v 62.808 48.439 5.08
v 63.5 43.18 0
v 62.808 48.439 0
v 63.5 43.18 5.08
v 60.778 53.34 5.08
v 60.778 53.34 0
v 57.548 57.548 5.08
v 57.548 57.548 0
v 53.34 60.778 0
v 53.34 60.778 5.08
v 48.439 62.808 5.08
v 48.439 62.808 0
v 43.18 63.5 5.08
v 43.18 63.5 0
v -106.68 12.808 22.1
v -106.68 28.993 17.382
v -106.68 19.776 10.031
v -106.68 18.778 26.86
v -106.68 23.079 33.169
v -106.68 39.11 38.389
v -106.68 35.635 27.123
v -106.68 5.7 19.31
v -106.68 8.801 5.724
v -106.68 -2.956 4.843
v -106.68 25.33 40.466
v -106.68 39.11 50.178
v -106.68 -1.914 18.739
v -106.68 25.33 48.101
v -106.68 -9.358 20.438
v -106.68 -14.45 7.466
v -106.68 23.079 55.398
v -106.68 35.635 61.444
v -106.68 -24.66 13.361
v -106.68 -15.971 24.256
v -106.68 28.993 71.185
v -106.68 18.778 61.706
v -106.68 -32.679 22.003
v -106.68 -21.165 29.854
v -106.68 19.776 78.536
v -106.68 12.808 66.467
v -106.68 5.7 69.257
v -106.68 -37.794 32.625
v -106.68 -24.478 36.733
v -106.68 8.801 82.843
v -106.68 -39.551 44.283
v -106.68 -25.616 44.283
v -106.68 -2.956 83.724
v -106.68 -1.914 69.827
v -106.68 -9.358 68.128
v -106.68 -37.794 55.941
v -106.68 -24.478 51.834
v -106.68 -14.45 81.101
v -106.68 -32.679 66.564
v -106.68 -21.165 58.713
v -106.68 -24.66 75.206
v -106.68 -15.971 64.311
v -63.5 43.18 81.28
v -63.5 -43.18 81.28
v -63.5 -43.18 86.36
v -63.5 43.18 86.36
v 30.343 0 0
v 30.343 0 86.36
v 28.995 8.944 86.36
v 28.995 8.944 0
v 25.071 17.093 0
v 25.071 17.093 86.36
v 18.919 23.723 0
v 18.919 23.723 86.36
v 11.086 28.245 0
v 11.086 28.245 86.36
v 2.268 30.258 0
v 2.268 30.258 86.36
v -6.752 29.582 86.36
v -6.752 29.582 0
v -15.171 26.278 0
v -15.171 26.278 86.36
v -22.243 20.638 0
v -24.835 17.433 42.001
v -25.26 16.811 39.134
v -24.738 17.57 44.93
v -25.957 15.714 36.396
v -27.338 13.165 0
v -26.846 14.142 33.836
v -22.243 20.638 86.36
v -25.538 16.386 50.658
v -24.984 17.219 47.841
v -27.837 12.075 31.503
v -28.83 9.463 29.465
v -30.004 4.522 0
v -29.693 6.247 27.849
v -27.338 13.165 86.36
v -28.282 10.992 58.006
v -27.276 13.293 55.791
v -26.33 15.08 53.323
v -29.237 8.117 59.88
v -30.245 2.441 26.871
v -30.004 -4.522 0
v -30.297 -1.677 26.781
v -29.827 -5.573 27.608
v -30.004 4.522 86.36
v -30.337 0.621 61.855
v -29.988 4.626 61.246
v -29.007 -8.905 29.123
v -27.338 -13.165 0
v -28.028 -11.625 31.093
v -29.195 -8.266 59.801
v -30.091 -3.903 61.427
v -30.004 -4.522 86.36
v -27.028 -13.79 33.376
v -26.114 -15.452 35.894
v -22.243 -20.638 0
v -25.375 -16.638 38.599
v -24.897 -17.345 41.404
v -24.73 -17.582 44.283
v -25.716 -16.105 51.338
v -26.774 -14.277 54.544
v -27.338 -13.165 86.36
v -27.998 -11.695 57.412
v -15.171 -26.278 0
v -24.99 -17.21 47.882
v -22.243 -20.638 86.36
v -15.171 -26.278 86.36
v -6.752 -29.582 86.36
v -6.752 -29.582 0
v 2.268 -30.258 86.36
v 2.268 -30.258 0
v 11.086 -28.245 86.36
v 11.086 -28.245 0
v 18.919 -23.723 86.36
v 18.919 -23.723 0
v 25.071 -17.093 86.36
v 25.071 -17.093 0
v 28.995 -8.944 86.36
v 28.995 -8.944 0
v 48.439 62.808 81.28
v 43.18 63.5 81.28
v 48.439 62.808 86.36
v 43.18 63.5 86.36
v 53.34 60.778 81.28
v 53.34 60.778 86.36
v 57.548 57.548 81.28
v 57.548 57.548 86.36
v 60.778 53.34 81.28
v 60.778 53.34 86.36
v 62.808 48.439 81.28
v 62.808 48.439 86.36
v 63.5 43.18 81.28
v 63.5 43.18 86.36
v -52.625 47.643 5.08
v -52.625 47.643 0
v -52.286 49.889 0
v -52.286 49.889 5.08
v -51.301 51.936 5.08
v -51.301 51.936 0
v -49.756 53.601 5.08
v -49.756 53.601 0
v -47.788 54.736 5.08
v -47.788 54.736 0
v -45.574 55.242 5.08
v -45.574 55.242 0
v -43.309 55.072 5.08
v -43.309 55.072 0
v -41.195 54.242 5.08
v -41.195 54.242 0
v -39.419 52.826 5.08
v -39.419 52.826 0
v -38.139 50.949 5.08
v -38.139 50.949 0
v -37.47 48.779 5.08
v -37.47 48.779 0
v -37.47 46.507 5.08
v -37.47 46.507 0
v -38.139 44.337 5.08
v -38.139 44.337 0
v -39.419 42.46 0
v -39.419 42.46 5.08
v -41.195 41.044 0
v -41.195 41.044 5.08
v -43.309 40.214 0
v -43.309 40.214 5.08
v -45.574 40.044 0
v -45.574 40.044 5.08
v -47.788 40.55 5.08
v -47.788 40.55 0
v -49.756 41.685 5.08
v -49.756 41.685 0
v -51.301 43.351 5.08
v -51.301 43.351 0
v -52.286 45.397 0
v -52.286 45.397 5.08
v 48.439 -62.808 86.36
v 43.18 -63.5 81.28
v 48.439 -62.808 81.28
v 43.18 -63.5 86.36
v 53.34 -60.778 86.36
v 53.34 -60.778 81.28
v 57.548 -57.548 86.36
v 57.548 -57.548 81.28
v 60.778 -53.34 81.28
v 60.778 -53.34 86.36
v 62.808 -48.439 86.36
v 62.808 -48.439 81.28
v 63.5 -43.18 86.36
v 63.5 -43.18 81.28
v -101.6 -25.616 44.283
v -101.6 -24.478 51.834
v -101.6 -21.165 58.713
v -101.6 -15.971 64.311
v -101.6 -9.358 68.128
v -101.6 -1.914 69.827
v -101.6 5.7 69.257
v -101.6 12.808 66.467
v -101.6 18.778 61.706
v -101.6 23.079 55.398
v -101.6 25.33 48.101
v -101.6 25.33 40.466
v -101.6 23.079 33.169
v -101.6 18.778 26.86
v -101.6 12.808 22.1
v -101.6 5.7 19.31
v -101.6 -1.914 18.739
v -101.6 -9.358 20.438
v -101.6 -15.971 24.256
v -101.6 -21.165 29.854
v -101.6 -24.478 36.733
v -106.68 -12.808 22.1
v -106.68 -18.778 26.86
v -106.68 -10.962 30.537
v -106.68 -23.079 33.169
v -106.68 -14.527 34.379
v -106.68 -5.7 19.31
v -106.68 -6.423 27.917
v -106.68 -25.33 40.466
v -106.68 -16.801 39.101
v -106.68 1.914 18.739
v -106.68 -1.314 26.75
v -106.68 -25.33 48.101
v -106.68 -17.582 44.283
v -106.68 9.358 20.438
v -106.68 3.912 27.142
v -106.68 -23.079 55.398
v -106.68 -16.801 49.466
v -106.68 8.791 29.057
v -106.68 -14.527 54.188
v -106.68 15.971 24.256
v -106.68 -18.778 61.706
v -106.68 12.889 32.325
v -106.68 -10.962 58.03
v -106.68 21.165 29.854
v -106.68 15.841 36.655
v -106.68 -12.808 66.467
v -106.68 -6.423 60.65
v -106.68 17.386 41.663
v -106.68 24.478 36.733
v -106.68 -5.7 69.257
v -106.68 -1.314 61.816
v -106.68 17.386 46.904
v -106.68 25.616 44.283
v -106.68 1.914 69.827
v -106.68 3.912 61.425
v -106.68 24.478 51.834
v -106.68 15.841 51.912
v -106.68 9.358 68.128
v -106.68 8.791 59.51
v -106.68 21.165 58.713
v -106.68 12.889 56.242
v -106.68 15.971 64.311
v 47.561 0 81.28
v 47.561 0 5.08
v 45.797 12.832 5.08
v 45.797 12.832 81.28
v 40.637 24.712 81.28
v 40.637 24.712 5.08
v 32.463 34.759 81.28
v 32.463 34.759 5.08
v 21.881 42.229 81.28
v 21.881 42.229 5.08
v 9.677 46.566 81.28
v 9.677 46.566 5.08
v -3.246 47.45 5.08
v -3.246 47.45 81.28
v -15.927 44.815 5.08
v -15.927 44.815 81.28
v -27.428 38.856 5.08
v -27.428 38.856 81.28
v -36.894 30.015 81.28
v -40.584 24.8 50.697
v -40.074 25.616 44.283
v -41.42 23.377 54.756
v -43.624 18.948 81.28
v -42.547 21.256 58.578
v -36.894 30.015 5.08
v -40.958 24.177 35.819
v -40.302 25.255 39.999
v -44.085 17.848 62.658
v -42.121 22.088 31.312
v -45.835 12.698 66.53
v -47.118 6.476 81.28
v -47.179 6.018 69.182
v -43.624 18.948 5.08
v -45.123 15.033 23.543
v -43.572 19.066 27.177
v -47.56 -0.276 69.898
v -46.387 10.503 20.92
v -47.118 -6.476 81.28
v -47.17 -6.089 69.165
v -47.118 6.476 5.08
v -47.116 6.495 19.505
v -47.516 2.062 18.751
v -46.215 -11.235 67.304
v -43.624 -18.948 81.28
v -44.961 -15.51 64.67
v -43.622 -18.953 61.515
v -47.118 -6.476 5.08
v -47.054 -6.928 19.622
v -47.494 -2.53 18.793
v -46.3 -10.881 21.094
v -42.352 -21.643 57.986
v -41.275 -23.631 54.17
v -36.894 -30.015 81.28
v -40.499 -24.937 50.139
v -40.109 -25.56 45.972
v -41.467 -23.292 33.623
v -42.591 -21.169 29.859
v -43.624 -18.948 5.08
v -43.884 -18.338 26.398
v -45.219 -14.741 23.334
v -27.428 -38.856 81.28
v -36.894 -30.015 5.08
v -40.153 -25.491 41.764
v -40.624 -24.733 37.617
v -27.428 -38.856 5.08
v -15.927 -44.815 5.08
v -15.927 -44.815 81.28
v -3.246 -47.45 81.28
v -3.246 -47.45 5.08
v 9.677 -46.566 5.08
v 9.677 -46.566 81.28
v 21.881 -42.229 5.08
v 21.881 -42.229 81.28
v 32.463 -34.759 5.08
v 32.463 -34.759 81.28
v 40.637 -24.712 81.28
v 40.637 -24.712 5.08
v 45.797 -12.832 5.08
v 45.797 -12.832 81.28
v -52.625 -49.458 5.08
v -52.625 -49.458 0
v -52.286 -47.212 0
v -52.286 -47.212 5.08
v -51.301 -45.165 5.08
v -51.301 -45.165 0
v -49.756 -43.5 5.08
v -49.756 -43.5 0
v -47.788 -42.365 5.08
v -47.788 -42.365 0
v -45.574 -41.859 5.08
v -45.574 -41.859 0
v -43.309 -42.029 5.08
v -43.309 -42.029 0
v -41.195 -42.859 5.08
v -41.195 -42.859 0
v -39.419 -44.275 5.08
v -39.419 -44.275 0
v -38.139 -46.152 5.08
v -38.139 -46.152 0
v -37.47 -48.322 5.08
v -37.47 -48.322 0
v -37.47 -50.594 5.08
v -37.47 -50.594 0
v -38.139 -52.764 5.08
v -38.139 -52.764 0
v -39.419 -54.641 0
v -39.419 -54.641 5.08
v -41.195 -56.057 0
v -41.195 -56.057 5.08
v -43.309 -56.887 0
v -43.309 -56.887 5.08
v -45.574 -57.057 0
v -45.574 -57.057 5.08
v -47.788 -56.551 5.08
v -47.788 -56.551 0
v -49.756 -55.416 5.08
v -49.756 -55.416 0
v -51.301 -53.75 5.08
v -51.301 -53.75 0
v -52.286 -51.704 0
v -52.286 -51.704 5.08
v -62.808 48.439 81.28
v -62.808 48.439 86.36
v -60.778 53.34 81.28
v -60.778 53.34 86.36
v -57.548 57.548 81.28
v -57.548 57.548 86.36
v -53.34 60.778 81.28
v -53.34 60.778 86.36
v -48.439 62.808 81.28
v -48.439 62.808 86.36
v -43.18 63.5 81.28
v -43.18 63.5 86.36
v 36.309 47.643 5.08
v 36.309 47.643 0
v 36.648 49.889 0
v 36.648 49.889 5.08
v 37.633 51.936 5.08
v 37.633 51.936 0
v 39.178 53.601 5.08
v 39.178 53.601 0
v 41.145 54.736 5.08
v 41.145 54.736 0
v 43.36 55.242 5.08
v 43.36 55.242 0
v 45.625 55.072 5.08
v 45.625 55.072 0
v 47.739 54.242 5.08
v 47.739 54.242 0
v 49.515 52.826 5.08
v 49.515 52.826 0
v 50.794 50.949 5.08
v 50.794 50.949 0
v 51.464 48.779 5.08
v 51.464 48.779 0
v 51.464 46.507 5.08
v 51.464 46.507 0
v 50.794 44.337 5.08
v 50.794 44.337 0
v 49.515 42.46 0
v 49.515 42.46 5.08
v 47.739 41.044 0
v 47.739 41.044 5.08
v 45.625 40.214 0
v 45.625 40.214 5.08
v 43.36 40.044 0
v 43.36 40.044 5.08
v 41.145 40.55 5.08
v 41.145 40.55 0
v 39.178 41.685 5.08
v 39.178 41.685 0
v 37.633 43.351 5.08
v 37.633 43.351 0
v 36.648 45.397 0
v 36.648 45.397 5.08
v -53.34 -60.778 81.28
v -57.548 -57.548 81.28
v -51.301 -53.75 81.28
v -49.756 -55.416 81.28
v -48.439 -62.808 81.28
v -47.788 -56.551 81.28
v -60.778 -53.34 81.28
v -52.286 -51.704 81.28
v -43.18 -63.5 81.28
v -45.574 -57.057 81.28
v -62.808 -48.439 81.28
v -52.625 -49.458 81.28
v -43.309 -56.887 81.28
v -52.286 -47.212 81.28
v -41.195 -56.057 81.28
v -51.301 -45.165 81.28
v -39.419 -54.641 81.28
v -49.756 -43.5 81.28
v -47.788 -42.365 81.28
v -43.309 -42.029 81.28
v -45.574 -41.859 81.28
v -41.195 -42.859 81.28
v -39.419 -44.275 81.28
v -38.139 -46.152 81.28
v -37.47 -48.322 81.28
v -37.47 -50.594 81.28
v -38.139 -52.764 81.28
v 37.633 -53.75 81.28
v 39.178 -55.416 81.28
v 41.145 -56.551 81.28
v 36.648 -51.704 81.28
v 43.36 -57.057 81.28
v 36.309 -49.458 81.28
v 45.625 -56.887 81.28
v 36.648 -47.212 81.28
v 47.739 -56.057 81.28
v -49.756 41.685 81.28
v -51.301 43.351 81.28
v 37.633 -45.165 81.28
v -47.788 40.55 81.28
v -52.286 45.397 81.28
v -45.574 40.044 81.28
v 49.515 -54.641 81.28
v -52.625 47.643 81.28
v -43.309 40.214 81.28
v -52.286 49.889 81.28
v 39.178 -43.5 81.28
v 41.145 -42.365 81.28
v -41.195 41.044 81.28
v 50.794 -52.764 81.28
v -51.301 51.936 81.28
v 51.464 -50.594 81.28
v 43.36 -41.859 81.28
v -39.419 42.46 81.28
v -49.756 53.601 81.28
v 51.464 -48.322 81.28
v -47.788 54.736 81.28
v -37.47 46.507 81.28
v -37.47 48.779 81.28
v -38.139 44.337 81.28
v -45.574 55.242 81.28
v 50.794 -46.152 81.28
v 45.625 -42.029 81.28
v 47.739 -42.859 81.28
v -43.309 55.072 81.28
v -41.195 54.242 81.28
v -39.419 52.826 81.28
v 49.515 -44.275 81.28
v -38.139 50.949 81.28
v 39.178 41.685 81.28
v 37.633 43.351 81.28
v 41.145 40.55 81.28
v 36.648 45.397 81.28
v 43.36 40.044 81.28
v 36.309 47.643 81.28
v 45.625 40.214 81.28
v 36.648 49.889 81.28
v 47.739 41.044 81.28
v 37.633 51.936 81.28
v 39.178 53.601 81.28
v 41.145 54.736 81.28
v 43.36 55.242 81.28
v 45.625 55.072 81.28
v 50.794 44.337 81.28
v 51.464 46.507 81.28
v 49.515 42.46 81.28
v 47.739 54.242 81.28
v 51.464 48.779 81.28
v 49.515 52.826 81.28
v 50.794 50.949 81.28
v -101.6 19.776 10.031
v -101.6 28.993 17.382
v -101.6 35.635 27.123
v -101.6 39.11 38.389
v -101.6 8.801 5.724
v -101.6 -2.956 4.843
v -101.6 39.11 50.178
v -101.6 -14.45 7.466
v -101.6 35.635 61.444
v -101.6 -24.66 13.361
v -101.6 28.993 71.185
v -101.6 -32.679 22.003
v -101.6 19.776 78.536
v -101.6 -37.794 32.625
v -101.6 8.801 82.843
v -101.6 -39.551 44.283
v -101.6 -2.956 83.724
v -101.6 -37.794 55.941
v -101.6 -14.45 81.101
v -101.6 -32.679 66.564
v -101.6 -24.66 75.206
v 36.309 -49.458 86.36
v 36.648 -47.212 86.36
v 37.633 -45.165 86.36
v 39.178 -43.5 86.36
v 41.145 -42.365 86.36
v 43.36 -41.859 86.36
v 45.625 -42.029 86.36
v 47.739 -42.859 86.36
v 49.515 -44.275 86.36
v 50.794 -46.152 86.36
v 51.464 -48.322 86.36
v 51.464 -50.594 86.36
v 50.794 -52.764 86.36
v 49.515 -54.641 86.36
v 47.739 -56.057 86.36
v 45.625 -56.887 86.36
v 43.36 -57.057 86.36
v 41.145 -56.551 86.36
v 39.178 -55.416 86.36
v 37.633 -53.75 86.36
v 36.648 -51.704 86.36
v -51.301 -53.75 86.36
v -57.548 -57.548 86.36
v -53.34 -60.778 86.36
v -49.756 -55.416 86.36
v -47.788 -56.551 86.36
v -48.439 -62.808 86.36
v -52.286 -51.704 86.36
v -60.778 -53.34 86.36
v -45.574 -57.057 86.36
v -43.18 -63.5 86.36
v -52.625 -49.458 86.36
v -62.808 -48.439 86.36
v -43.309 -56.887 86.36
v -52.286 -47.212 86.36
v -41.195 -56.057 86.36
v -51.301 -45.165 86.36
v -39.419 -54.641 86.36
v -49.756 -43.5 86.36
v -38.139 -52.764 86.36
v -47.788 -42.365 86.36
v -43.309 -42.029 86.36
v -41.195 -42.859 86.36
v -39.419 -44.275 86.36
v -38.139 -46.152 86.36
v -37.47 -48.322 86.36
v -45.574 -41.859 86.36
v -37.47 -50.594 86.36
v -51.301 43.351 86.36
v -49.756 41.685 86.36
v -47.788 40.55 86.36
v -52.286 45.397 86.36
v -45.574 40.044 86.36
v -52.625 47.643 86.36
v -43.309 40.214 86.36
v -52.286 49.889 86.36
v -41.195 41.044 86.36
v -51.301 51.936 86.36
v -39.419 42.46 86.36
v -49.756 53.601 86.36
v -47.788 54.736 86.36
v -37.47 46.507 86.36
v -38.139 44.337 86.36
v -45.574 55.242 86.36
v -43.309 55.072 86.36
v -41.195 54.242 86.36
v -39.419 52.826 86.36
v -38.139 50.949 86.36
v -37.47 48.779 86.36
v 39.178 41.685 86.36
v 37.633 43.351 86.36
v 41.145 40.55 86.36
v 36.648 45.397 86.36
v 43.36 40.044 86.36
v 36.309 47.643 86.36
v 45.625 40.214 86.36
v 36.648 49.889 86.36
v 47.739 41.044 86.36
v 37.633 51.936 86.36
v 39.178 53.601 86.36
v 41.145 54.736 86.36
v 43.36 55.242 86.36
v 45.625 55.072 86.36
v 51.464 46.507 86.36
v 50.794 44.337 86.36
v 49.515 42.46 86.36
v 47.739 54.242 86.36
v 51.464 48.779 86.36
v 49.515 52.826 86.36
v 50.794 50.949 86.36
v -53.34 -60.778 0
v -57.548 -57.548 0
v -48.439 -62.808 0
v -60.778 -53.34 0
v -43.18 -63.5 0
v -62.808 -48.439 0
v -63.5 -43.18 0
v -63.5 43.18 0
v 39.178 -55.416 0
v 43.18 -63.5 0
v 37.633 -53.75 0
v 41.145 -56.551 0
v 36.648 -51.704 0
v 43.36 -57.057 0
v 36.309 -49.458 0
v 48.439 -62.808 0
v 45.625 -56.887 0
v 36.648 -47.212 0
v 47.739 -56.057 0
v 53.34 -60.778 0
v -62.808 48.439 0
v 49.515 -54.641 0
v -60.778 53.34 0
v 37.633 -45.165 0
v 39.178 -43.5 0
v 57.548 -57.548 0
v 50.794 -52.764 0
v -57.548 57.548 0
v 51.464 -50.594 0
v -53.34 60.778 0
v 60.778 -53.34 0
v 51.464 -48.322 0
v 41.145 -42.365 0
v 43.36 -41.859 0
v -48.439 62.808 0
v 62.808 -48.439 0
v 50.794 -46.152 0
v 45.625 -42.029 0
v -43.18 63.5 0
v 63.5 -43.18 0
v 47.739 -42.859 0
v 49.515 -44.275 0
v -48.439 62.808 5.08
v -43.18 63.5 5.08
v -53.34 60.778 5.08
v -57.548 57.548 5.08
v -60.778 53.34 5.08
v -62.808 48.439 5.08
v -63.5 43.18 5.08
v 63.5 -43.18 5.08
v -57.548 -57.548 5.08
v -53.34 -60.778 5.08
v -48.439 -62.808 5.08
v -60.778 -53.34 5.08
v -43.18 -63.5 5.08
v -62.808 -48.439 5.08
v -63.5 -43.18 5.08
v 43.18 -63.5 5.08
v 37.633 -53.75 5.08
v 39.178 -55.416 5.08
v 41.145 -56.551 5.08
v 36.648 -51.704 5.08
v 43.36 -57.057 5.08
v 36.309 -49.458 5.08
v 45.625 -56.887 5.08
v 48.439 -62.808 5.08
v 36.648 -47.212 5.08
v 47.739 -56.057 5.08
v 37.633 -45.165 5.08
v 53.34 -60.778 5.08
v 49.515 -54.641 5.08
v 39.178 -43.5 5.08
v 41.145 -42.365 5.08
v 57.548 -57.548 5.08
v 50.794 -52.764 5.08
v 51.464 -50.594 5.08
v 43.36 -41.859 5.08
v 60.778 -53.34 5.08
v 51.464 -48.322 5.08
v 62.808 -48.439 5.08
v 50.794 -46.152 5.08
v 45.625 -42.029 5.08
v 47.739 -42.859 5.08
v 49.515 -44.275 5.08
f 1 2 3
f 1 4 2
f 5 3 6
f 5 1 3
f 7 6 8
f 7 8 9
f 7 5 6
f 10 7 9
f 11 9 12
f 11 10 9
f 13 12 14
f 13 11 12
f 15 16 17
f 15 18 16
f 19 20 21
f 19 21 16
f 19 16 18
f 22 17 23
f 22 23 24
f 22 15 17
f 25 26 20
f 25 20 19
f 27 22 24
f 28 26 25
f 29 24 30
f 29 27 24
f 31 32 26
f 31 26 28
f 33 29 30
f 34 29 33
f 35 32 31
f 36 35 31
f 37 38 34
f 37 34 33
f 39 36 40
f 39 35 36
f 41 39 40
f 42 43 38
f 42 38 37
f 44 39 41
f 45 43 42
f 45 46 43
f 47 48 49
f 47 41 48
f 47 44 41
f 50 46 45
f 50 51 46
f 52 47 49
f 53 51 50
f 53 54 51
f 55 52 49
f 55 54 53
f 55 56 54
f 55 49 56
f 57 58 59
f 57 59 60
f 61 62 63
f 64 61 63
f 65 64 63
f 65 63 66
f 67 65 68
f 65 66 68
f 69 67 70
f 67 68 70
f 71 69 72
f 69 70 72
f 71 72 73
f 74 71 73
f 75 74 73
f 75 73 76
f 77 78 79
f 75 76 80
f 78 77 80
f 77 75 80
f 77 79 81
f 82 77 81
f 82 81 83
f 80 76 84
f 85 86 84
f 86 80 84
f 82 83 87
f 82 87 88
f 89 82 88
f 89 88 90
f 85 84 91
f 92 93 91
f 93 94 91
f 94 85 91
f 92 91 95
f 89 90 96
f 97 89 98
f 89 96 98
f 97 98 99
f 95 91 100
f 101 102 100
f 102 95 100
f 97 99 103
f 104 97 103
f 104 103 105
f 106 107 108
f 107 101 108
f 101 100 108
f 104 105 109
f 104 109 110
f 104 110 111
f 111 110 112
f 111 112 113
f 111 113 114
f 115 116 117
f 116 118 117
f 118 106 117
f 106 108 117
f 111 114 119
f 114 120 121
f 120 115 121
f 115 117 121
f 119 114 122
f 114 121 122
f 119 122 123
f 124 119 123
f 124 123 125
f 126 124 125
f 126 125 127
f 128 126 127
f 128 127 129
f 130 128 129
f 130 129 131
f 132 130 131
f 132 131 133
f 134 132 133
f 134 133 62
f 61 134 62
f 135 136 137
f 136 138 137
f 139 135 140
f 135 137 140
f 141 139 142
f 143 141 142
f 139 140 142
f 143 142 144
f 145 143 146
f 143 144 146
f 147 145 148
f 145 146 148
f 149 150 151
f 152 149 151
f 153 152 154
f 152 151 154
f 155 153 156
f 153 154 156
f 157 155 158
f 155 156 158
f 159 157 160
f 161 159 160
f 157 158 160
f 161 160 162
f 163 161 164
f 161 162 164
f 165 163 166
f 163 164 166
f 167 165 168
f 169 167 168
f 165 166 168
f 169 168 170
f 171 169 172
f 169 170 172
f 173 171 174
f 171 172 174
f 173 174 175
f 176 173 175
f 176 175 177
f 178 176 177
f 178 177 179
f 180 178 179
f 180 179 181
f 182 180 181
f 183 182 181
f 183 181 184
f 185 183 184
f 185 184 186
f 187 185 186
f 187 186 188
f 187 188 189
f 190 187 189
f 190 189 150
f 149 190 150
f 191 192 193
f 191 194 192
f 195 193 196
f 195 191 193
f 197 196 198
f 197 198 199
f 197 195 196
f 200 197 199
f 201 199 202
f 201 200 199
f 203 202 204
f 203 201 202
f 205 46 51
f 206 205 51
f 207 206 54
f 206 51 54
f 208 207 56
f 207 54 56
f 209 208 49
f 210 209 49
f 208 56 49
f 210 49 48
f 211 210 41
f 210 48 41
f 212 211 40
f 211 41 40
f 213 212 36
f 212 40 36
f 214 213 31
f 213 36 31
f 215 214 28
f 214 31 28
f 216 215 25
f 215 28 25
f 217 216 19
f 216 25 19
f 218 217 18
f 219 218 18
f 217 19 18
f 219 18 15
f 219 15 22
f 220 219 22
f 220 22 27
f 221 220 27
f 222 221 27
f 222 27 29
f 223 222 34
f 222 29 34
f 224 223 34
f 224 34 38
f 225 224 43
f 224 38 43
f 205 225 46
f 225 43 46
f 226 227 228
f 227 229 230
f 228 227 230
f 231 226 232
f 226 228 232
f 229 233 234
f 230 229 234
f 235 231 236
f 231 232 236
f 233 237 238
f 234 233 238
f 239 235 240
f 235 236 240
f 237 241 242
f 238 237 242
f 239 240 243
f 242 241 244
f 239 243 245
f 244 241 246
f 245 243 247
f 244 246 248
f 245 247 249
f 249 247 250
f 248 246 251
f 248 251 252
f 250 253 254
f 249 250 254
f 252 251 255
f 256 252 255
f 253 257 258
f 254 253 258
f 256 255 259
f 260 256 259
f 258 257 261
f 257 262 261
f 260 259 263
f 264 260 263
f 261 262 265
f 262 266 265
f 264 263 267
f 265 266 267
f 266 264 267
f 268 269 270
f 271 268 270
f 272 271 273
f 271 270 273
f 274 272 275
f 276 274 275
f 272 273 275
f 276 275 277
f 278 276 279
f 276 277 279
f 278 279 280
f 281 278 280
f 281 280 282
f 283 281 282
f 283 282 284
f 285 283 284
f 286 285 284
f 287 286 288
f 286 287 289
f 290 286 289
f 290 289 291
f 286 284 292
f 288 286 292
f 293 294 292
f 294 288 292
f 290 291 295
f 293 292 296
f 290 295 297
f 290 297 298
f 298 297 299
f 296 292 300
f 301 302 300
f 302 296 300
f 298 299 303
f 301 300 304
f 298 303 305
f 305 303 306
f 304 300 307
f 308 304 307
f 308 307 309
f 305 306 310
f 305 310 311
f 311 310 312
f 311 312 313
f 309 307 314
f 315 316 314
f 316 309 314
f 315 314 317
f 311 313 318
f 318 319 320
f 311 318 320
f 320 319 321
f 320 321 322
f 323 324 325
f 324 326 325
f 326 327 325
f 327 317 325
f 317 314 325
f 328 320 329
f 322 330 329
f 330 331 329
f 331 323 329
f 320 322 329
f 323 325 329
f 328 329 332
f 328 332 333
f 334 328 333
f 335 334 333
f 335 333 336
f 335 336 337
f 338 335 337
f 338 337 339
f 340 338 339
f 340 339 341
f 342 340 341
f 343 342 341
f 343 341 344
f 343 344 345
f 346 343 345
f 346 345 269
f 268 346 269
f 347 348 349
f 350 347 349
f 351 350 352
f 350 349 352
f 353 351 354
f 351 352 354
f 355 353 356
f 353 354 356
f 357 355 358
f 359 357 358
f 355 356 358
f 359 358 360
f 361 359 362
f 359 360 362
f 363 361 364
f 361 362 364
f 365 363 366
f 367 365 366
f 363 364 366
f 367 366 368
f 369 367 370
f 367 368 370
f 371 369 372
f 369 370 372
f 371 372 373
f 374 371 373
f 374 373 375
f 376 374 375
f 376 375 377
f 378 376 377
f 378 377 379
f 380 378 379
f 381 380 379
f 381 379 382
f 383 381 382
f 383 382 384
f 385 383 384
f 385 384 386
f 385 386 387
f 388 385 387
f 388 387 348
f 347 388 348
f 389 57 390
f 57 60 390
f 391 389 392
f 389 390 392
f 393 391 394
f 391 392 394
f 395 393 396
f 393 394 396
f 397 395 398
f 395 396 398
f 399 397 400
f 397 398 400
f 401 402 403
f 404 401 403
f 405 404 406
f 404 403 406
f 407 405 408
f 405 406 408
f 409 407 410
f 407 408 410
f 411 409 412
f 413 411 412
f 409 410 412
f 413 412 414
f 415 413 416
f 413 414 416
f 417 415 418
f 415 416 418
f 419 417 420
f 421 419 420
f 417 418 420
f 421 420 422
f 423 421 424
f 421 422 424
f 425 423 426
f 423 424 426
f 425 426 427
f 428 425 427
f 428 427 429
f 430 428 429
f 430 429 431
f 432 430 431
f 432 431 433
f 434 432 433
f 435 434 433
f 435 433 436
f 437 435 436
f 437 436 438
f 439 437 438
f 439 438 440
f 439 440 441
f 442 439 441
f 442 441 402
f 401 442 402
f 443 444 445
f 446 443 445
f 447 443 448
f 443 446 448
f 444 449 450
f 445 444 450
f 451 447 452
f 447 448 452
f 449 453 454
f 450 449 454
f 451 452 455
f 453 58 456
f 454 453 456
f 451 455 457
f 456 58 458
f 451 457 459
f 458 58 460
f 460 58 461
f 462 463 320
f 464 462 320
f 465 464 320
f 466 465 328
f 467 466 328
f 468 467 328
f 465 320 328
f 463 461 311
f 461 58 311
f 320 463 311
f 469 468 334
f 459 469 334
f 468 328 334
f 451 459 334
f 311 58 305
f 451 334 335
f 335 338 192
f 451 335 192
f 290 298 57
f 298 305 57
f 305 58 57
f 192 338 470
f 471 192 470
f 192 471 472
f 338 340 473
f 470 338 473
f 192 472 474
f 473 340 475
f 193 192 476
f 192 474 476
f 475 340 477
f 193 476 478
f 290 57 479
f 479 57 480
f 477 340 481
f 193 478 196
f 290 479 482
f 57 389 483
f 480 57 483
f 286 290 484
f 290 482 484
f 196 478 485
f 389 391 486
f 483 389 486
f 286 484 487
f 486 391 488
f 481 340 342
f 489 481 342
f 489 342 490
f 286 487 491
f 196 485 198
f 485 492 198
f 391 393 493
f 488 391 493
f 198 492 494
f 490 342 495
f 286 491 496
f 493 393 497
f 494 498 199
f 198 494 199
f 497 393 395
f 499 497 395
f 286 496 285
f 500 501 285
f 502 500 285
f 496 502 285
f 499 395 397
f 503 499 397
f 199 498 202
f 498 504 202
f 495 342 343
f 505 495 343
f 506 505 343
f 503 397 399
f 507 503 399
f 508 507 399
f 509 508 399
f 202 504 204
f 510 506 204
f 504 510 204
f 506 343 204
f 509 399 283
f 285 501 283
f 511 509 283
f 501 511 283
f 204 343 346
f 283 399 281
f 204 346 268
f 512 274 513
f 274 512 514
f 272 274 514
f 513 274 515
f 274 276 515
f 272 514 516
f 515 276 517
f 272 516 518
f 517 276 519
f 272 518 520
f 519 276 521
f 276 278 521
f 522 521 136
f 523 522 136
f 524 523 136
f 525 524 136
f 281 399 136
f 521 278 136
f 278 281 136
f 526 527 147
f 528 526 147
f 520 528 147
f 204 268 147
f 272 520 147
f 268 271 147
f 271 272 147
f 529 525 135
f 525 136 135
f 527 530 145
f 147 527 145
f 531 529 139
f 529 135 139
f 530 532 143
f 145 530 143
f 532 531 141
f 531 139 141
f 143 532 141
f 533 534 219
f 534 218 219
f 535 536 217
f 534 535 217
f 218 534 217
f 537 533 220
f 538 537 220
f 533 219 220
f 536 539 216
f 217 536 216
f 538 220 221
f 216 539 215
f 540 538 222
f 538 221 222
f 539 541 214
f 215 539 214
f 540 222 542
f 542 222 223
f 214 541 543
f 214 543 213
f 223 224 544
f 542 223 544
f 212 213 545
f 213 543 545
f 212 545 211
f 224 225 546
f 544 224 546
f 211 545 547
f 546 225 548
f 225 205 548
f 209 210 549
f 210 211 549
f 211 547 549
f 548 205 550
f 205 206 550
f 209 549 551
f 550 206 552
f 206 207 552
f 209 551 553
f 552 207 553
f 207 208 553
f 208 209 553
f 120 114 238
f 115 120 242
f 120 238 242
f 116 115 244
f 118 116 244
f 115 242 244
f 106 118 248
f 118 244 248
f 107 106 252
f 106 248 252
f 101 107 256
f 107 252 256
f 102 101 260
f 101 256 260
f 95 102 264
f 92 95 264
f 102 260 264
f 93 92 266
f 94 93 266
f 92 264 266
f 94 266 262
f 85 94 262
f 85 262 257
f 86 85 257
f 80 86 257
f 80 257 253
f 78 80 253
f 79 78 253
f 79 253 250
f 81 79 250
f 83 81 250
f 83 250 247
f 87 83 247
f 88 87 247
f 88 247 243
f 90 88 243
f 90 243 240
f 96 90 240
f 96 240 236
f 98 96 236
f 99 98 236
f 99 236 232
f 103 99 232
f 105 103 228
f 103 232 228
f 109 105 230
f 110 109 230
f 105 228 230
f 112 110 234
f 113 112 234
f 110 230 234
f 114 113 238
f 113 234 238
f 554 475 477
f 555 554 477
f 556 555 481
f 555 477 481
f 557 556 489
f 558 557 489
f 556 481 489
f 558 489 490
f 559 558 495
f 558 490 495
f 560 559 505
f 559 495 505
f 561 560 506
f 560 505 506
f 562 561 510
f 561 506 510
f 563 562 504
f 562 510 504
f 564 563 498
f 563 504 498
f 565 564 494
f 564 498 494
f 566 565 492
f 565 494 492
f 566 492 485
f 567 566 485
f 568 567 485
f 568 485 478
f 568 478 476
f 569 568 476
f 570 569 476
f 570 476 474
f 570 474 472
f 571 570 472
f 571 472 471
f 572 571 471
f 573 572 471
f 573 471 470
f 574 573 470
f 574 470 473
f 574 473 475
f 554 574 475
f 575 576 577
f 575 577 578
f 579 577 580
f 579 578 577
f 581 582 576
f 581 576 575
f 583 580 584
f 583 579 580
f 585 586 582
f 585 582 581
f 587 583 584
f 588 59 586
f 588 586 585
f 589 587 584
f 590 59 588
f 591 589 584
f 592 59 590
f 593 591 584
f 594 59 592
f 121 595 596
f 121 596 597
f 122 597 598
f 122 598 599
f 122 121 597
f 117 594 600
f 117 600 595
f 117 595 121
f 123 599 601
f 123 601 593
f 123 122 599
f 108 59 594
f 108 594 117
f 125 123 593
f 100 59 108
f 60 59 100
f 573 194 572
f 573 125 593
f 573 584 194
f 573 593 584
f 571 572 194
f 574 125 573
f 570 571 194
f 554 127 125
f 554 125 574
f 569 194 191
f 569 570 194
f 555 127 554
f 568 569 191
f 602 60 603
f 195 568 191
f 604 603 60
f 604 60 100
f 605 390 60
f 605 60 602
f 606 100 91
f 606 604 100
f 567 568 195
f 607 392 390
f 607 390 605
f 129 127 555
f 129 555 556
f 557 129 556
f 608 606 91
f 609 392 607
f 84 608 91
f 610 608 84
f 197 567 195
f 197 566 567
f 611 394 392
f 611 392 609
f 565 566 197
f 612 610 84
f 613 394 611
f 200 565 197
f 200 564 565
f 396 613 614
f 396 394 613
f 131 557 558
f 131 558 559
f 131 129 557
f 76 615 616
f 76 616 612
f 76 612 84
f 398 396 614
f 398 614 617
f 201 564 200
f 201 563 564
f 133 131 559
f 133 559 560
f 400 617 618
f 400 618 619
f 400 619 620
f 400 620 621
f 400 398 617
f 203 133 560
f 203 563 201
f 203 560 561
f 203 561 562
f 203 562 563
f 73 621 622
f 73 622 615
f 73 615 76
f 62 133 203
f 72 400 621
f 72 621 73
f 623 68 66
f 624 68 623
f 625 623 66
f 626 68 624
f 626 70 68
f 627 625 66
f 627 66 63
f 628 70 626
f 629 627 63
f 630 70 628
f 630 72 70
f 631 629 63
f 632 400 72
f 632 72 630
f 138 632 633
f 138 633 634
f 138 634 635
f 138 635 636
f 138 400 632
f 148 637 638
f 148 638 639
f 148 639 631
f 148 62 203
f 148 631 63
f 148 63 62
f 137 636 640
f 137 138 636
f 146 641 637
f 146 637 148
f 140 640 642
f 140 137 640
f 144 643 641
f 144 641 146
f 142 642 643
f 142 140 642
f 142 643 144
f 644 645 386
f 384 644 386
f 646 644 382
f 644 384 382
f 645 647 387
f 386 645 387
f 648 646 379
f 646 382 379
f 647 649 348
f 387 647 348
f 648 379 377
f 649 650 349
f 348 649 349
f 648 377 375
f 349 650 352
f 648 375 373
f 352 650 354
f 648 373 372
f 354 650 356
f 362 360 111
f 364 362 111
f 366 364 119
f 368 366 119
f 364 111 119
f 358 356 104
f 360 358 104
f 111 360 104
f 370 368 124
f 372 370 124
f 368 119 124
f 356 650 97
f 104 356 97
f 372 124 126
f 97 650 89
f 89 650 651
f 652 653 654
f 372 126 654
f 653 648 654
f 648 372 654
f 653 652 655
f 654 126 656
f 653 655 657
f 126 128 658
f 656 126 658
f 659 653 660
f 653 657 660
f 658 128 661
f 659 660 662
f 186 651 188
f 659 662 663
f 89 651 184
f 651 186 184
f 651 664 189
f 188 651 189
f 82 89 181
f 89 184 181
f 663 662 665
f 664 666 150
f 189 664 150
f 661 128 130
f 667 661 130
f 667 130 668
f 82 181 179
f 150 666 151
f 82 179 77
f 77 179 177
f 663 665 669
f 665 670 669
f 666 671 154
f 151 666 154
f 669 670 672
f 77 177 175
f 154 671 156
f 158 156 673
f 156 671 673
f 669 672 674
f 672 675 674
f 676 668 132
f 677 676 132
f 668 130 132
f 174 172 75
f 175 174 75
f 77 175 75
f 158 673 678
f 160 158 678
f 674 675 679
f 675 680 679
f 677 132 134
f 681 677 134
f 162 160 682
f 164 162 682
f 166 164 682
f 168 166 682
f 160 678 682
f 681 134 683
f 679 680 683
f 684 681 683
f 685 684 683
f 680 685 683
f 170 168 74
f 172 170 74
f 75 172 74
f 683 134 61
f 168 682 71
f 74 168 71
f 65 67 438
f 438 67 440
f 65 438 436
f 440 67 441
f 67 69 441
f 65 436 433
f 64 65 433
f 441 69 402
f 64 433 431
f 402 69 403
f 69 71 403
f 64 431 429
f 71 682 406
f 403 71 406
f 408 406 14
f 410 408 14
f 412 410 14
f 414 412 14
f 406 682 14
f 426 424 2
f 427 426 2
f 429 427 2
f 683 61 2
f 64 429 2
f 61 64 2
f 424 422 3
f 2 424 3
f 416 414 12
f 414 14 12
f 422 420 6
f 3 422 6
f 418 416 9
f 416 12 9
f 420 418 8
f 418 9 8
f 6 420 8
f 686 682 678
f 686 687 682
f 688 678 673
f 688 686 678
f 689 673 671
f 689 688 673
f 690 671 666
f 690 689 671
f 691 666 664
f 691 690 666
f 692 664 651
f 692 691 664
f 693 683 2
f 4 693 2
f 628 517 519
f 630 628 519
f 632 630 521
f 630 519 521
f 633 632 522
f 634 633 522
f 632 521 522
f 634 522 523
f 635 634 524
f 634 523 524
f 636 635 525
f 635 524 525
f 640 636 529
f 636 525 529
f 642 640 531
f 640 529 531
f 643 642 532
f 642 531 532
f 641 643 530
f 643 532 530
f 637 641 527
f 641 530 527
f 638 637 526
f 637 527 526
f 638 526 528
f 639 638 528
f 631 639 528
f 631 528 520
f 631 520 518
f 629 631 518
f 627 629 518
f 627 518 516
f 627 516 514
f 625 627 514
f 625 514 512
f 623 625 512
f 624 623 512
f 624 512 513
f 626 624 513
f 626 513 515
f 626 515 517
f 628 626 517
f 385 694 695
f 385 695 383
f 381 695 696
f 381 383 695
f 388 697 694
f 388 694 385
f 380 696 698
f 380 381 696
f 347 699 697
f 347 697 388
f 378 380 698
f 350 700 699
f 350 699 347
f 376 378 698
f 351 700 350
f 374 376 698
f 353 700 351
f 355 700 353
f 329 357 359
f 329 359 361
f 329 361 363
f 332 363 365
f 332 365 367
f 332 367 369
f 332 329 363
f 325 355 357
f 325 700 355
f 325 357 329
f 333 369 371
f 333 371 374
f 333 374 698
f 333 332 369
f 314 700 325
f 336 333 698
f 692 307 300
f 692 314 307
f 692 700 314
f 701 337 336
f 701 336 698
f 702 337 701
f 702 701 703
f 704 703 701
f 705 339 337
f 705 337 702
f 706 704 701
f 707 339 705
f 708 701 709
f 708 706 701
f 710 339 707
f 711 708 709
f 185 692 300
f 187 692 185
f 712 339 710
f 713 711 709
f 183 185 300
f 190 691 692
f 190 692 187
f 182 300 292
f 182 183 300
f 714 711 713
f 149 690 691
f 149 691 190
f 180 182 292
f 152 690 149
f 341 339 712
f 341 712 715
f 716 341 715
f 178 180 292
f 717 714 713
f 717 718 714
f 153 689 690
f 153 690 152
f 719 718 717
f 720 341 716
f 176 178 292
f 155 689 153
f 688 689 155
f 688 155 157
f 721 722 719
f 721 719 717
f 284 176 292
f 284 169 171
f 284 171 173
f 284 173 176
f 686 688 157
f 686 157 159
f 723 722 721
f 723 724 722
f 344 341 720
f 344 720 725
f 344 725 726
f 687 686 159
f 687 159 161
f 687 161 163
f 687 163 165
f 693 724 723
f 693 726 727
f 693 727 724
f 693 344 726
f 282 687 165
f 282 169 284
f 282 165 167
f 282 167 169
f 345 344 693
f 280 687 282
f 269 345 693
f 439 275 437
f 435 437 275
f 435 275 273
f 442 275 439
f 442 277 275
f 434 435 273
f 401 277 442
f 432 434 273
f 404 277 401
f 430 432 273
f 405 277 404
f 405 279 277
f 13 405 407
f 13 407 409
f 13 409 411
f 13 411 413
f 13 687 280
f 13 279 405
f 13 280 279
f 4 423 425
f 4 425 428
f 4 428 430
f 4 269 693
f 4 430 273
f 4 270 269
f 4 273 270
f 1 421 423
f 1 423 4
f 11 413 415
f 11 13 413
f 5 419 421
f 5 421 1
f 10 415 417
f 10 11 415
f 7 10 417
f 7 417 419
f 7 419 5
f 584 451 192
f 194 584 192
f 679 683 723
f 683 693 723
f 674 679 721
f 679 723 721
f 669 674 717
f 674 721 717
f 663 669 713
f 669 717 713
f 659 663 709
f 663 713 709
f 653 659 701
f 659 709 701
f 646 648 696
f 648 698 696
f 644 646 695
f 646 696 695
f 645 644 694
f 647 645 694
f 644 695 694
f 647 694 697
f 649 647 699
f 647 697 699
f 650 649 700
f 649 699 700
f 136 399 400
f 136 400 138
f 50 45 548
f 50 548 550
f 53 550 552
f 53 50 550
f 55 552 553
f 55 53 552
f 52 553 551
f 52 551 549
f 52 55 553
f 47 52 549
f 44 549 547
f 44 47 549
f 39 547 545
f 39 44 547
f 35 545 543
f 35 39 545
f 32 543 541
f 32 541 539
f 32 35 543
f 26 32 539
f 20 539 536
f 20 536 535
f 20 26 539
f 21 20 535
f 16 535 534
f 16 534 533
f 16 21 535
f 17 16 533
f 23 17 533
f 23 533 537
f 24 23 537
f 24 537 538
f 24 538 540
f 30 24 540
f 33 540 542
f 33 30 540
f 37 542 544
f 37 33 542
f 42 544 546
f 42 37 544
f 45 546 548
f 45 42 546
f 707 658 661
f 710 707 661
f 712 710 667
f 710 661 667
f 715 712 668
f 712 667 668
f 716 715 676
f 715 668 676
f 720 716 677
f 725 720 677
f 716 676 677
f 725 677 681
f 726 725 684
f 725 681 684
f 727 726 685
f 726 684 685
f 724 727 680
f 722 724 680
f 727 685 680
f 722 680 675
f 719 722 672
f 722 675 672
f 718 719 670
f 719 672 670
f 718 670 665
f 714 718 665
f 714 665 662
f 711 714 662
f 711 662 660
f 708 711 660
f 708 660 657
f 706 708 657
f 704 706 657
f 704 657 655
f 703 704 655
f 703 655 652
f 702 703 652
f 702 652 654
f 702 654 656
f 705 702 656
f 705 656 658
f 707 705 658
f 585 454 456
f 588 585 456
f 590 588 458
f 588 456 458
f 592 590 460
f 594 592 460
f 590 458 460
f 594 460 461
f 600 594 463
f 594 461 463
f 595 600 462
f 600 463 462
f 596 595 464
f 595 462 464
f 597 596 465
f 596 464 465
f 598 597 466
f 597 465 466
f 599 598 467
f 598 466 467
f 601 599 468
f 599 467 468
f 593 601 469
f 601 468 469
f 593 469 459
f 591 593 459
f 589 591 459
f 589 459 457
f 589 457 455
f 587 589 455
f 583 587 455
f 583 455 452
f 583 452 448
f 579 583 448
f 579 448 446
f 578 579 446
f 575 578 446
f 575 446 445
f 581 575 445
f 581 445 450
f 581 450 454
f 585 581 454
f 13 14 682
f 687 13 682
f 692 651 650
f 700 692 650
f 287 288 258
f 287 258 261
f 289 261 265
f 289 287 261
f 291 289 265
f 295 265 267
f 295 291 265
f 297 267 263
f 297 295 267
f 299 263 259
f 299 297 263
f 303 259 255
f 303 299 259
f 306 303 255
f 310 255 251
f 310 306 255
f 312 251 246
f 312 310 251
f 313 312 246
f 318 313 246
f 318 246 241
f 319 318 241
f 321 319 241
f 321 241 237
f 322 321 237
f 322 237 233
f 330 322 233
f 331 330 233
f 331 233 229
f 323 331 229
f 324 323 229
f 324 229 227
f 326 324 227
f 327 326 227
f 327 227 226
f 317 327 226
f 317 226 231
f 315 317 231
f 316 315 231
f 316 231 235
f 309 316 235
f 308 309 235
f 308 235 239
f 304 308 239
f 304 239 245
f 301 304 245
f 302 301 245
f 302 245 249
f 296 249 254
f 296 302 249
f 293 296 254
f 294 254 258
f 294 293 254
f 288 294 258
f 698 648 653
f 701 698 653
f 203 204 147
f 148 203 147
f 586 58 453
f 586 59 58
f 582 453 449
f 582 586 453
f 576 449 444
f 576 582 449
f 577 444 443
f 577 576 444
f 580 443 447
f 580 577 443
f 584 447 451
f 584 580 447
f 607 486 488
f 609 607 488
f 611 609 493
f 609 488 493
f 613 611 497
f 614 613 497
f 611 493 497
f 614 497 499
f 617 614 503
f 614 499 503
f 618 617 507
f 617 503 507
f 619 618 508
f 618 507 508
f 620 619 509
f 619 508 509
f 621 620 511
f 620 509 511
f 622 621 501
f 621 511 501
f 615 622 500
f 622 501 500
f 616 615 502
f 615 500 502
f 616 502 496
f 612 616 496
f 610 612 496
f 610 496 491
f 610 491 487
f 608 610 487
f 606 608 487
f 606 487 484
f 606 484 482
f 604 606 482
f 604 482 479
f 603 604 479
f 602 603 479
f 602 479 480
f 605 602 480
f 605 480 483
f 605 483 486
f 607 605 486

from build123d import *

# Parameters (mm, degrees)
F1_DEPTH  = 5.08
F2_R      = 47.561157
F3_DEPTH  = 76.2
F4_W      = 127
F4_H      = 127
F5_DEPTH  = 5.08
F6_R      = 20.32
F7_R      = 25.615644
F8_DEPTH  = 106.68
F9_R      = 39.551434
F9_R_2    = 25.615644
F10_DEPTH = 5.08
F12_D     = 15.24
F13_R     = 30.342929
F14_DEPTH = 254
F15_R     = 17.582128
F16_DEPTH = 101.6


with BuildPart() as f1:
    # F0 (on Top) → F1 (new body)
    with BuildSketch(Plane.XY):
        Polygon((63.5, -63.5), (63.5, 0), (63.5, 63.5), (0, 63.5), (-63.5, 63.5), (-63.5, 0), (-63.5, -63.5), (0, -63.5), align=None)
    extrude(amount=F1_DEPTH)

    # F2 (on face) → F3 (join)
    with BuildSketch(Plane.XY.offset(5.08)):
        Circle(F2_R)
    extrude(amount=F3_DEPTH)

    # F4 (on face) → F5 (join)
    with BuildSketch(Plane.XY.offset(81.28)):
        Rectangle(F4_W, F4_H)
    extrude(amount=F5_DEPTH)

    # F6
    f6_edges = [f1.edges().sort_by_distance(p)[0] for p in [
        (-63.5, 63.5, 2.54),
        (-63.5, 63.5, 83.82),
        (63.5, 63.5, 83.82),
        (63.5, 63.5, 2.54),
        (63.5, -63.5, 2.54),
        (63.5, -63.5, 83.82),
        (-63.5, -63.5, 83.82),
        (-63.5, -63.5, 2.54),
    ]]
    fillet(f6_edges, radius=F6_R)

    # F7 (on Right) → F8 (join)
    with BuildSketch(Plane.YZ):
        with Locations((0, 44.28339)):
            Circle(F7_R)
    extrude(amount=-F8_DEPTH)

    # F12 (through all)
    with Locations(Plane.XY.offset(86.36)):
        with Locations((-45.004573, 47.64301), (43.92904, 47.64301), (43.92904, -49.457978), (-45.004573, -49.457978)):
            Hole(F12_D / 2)

    # F13 (on face) → F14 (cut)
    with BuildSketch(Plane.XY.offset(86.36)):
        Circle(F13_R)
    extrude(amount=-F14_DEPTH, mode=Mode.SUBTRACT)

    # F15 (on face) → F16 (cut)
    with BuildSketch(Plane(origin=(-106.68, 0, 0), x_dir=(0, -1, 0), z_dir=(-1, 0, 0))):
        with Locations((0, 44.28339)):
            Circle(F15_R)
    extrude(amount=-F16_DEPTH, mode=Mode.SUBTRACT)


with BuildPart() as f10:
    # F9 (on face) → F10 (new body)
    with BuildSketch(Plane(origin=(-106.68, 0, 0), x_dir=(0, -1, 0), z_dir=(-1, 0, 0))):
        with Locations((0, 44.28339)):
            Circle(F9_R)
        with Locations((0, 44.28339)):
            Circle(F9_R_2, mode=Mode.SUBTRACT)
    extrude(amount=-F10_DEPTH)


solid = Compound([f1.part, f10.part])
